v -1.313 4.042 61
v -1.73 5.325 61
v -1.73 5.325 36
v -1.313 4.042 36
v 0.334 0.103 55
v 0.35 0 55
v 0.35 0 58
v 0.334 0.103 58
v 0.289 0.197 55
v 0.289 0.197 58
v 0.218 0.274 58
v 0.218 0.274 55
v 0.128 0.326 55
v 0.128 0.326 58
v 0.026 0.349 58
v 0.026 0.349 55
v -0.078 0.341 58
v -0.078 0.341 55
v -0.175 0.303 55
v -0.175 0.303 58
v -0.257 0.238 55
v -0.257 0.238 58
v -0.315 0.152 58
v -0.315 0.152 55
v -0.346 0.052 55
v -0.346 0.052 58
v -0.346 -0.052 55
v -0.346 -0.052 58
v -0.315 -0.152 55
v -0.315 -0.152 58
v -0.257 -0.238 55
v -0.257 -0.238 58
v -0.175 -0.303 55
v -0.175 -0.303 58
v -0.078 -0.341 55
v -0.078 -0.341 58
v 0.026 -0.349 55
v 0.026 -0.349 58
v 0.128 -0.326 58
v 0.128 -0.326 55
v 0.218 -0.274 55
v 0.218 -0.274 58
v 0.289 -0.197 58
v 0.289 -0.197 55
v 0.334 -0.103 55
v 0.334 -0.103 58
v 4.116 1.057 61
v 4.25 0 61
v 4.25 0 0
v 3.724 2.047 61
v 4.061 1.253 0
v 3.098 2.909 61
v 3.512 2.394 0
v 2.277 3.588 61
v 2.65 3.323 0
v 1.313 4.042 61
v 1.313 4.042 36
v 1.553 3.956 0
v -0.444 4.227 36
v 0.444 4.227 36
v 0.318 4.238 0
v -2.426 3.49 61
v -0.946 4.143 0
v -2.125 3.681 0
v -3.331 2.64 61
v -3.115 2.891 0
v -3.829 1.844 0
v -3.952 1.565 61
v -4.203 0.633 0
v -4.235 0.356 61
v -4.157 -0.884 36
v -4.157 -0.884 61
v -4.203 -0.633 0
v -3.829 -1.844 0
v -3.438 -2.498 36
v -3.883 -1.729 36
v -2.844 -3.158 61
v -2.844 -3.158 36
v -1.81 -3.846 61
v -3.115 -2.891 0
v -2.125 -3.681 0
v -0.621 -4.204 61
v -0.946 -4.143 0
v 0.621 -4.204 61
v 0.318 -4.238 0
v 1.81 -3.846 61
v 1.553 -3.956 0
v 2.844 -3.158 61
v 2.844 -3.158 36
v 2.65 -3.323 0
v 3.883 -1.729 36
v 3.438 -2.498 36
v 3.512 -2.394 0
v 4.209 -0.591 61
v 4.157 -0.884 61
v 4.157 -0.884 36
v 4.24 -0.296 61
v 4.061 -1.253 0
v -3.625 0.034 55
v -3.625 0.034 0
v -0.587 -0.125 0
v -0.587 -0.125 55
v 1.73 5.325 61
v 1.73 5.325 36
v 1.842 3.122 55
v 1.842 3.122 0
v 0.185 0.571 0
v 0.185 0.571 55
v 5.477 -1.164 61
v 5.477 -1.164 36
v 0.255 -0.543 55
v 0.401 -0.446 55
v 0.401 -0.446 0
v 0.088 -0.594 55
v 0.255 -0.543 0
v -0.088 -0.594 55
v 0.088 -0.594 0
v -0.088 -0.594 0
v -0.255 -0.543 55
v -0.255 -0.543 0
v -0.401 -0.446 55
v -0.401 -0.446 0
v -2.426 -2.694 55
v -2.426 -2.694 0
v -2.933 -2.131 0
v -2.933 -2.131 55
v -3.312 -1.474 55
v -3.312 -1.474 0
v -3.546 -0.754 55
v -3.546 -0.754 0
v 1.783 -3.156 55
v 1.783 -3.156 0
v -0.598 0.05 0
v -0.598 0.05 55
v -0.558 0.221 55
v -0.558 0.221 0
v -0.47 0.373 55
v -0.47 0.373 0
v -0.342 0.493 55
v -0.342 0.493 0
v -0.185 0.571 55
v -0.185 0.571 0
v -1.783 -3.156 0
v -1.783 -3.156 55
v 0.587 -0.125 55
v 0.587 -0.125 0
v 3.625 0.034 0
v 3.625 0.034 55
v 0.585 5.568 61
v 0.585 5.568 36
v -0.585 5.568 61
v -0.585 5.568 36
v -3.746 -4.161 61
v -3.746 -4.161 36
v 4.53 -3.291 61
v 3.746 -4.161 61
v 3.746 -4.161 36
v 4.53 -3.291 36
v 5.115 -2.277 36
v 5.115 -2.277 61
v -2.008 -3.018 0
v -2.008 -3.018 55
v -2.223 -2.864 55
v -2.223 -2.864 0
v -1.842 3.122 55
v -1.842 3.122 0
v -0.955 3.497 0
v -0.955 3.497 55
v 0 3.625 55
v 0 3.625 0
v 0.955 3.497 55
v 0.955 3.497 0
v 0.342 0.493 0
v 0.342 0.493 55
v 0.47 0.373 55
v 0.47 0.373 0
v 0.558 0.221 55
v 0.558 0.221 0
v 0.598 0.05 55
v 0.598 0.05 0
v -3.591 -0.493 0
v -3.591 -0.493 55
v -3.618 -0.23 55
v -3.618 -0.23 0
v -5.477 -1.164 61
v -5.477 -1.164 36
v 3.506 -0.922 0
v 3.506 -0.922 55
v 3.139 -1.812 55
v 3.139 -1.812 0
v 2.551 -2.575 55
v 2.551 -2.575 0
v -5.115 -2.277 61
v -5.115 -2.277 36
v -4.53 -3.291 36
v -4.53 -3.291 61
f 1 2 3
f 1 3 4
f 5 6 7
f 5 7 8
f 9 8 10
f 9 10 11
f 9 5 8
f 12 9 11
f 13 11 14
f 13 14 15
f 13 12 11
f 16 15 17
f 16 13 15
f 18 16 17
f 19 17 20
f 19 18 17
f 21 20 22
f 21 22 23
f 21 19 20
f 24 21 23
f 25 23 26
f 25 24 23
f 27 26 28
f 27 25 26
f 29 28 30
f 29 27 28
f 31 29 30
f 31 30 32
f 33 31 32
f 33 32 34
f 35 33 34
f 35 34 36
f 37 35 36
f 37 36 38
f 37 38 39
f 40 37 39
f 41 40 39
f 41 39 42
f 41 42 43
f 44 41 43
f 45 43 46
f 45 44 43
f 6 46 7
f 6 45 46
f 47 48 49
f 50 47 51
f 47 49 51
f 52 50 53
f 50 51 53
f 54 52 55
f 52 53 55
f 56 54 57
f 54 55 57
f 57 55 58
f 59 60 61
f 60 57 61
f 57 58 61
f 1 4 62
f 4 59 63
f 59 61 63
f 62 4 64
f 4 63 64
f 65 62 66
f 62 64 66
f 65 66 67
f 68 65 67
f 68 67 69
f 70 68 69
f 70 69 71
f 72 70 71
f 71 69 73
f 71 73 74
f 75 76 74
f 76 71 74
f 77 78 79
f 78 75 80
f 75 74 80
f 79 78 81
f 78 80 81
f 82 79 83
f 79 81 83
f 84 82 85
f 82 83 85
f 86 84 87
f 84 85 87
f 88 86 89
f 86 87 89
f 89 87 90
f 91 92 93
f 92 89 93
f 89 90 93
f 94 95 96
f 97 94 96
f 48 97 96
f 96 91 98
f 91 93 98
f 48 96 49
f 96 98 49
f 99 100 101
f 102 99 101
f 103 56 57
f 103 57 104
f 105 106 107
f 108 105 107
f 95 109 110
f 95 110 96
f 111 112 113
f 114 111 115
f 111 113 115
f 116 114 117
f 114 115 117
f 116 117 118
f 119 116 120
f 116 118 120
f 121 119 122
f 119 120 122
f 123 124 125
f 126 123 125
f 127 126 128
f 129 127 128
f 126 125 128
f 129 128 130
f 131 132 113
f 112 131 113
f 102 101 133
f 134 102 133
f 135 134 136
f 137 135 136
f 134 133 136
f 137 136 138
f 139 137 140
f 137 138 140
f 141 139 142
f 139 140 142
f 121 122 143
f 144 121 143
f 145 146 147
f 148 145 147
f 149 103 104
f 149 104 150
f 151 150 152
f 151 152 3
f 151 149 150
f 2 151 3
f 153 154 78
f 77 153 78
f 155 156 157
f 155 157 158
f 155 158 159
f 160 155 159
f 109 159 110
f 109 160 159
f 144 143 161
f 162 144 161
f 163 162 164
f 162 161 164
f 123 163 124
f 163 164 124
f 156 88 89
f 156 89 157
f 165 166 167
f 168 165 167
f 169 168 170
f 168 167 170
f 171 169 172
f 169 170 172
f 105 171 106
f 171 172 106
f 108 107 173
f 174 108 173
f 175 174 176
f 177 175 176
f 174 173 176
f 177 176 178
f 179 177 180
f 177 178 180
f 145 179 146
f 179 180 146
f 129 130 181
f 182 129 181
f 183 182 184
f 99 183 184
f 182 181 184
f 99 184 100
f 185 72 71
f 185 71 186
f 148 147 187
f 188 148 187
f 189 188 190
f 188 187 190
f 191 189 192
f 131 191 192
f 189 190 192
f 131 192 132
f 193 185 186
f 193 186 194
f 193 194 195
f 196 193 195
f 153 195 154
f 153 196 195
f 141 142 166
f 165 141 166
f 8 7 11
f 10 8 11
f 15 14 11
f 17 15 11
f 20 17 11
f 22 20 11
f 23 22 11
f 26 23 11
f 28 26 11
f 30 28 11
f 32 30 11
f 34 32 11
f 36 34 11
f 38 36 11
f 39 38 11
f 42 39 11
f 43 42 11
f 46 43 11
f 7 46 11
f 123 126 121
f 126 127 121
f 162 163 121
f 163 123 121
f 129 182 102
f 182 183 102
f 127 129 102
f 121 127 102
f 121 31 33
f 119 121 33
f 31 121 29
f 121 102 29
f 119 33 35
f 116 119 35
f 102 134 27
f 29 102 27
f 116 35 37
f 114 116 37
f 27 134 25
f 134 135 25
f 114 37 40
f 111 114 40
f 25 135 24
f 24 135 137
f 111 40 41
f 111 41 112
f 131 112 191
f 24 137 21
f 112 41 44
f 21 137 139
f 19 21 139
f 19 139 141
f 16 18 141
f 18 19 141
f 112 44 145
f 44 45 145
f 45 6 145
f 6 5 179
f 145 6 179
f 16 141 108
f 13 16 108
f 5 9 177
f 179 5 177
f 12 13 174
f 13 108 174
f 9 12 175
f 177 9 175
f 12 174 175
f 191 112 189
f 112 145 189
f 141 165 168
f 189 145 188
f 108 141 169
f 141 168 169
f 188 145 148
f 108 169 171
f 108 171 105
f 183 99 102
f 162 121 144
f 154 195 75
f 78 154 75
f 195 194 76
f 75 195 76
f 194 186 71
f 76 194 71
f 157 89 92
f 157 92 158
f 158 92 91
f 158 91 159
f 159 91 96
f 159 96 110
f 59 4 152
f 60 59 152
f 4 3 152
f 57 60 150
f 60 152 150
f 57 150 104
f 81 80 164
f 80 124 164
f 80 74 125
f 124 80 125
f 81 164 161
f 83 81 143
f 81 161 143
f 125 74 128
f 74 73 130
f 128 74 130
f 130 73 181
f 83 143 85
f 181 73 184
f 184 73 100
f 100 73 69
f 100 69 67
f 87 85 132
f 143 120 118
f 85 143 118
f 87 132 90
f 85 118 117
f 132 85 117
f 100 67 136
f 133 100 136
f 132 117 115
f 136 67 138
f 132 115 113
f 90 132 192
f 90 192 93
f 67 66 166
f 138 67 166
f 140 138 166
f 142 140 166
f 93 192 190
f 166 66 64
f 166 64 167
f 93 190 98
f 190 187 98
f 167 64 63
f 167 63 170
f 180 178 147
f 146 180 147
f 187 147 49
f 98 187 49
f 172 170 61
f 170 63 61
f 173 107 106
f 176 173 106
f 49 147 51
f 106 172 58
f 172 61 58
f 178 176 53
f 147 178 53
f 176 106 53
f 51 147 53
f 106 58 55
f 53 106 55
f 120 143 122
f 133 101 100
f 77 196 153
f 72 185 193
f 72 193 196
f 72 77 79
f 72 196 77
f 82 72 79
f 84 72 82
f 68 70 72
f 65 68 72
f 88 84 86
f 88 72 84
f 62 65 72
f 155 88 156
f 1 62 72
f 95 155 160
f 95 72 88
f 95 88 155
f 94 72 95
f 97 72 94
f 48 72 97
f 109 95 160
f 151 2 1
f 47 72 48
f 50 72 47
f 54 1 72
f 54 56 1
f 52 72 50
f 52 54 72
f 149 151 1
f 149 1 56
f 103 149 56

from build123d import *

# Parameters (mm, degrees)
F0_R     = 4.25
F1_DEPTH = 55
F2_R     = 4.25
F2_R_2   = 0.35
F3_DEPTH = 3
F4_R     = 4.25
F5_DEPTH = 3
F7_DEPTH = 25


with BuildPart() as f1:
    # F0 (on Top) → F1 (new body)
    with BuildSketch(Plane.XY):
        Circle(F0_R)
        with BuildLine():
            ThreePointArc((0.4014783638, -0.4458868953), (0, -0.6), (-0.4014783638, -0.4458868953))
            Line((-0.4014783638, -0.4458868953), (-1.7825704497, -3.1564327321))
            ThreePointArc((-1.7825704497, -3.1564327321), (-2.1167558909, -2.9427826114), (-2.4255984481, -2.6938999924))
            ThreePointArc((-2.4255984481, -2.6938999924), (-3.1393420887, -1.8125), (-3.5457850527, -0.7536798792))
            ThreePointArc((-3.5457850527, -0.7536798792), (-3.6069024448, -0.3617730694), (-3.6248361561, 0.0344650726))
            Line((-3.6248361561, 0.0344650726), (-0.5868885604, -0.1247470145))
            ThreePointArc((-0.5868885604, -0.1247470145), (-0.5196152423, 0.3), (-0.1854101966, 0.5706339098))
            Line((-0.1854101966, 0.5706339098), (-1.8422657065, 3.1219676595))
            ThreePointArc((-1.8422657065, 3.1219676595), (0, 3.625), (1.8422657065, 3.1219676595))
            Line((1.8422657065, 3.1219676595), (0.1854101966, 0.5706339098))
            ThreePointArc((0.1854101966, 0.5706339098), (0.5196152423, 0.3), (0.5868885604, -0.1247470145))
            Line((0.5868885604, -0.1247470145), (3.6248361561, 0.0344650726))
            ThreePointArc((3.6248361561, 0.0344650726), (3.1393420887, -1.8125), (1.7825704497, -3.1564327321))
            Line((1.7825704497, -3.1564327321), (0.4014783638, -0.4458868953))
        make_face(mode=Mode.SUBTRACT)
    extrude(amount=F1_DEPTH)

    # F2 (on face) → F3 (join)
    with BuildSketch(Plane.XY.offset(55)):
        Circle(F2_R)
        Circle(F2_R_2, mode=Mode.SUBTRACT)
    extrude(amount=F3_DEPTH)

    # F4 (on face) → F5 (join)
    with BuildSketch(Plane.XY.offset(58)):
        Circle(F4_R)
    extrude(amount=F5_DEPTH)

    # F6 (on face) → F7 (join)
    with BuildSketch(Plane.XY.offset(61)):
        with BuildLine():
            ThreePointArc((-2.843805077, -3.1583655083), (-3.6806079661, -2.125), (-4.1571273031, -0.883624686))
            Line((-4.1571273031, -0.883624686), (-5.4765591727, -1.1640785875))
            ThreePointArc((-5.4765591727, -1.1640785875), (-4.8487972217, -2.7994543812), (-3.7464012151, -4.1608000751))
            Line((-3.7464012151, -4.1608000751), (-2.843805077, -3.1583655083))
        make_face()
        with BuildLine():
            ThreePointArc((-1.3133222261, 4.0419901943), (0, 4.25), (1.3133222261, 4.0419901943))
            Line((1.3133222261, 4.0419901943), (1.7301579575, 5.3248786626))
            ThreePointArc((1.7301579575, 5.3248786626), (0, 5.5989087624), (-1.7301579575, 5.3248786626))
            Line((-1.7301579575, 5.3248786626), (-1.3133222261, 4.0419901943))
        make_face()
        with BuildLine():
            ThreePointArc((4.1571273031, -0.883624686), (3.6806079661, -2.125), (2.843805077, -3.1583655083))
            Line((2.843805077, -3.1583655083), (3.7464012151, -4.1608000751))
            ThreePointArc((3.7464012151, -4.1608000751), (4.8487972217, -2.7994543812), (5.4765591727, -1.1640785875))
            Line((5.4765591727, -1.1640785875), (4.1571273031, -0.883624686))
        make_face()
    extrude(amount=-F7_DEPTH)


solid = f1.part
